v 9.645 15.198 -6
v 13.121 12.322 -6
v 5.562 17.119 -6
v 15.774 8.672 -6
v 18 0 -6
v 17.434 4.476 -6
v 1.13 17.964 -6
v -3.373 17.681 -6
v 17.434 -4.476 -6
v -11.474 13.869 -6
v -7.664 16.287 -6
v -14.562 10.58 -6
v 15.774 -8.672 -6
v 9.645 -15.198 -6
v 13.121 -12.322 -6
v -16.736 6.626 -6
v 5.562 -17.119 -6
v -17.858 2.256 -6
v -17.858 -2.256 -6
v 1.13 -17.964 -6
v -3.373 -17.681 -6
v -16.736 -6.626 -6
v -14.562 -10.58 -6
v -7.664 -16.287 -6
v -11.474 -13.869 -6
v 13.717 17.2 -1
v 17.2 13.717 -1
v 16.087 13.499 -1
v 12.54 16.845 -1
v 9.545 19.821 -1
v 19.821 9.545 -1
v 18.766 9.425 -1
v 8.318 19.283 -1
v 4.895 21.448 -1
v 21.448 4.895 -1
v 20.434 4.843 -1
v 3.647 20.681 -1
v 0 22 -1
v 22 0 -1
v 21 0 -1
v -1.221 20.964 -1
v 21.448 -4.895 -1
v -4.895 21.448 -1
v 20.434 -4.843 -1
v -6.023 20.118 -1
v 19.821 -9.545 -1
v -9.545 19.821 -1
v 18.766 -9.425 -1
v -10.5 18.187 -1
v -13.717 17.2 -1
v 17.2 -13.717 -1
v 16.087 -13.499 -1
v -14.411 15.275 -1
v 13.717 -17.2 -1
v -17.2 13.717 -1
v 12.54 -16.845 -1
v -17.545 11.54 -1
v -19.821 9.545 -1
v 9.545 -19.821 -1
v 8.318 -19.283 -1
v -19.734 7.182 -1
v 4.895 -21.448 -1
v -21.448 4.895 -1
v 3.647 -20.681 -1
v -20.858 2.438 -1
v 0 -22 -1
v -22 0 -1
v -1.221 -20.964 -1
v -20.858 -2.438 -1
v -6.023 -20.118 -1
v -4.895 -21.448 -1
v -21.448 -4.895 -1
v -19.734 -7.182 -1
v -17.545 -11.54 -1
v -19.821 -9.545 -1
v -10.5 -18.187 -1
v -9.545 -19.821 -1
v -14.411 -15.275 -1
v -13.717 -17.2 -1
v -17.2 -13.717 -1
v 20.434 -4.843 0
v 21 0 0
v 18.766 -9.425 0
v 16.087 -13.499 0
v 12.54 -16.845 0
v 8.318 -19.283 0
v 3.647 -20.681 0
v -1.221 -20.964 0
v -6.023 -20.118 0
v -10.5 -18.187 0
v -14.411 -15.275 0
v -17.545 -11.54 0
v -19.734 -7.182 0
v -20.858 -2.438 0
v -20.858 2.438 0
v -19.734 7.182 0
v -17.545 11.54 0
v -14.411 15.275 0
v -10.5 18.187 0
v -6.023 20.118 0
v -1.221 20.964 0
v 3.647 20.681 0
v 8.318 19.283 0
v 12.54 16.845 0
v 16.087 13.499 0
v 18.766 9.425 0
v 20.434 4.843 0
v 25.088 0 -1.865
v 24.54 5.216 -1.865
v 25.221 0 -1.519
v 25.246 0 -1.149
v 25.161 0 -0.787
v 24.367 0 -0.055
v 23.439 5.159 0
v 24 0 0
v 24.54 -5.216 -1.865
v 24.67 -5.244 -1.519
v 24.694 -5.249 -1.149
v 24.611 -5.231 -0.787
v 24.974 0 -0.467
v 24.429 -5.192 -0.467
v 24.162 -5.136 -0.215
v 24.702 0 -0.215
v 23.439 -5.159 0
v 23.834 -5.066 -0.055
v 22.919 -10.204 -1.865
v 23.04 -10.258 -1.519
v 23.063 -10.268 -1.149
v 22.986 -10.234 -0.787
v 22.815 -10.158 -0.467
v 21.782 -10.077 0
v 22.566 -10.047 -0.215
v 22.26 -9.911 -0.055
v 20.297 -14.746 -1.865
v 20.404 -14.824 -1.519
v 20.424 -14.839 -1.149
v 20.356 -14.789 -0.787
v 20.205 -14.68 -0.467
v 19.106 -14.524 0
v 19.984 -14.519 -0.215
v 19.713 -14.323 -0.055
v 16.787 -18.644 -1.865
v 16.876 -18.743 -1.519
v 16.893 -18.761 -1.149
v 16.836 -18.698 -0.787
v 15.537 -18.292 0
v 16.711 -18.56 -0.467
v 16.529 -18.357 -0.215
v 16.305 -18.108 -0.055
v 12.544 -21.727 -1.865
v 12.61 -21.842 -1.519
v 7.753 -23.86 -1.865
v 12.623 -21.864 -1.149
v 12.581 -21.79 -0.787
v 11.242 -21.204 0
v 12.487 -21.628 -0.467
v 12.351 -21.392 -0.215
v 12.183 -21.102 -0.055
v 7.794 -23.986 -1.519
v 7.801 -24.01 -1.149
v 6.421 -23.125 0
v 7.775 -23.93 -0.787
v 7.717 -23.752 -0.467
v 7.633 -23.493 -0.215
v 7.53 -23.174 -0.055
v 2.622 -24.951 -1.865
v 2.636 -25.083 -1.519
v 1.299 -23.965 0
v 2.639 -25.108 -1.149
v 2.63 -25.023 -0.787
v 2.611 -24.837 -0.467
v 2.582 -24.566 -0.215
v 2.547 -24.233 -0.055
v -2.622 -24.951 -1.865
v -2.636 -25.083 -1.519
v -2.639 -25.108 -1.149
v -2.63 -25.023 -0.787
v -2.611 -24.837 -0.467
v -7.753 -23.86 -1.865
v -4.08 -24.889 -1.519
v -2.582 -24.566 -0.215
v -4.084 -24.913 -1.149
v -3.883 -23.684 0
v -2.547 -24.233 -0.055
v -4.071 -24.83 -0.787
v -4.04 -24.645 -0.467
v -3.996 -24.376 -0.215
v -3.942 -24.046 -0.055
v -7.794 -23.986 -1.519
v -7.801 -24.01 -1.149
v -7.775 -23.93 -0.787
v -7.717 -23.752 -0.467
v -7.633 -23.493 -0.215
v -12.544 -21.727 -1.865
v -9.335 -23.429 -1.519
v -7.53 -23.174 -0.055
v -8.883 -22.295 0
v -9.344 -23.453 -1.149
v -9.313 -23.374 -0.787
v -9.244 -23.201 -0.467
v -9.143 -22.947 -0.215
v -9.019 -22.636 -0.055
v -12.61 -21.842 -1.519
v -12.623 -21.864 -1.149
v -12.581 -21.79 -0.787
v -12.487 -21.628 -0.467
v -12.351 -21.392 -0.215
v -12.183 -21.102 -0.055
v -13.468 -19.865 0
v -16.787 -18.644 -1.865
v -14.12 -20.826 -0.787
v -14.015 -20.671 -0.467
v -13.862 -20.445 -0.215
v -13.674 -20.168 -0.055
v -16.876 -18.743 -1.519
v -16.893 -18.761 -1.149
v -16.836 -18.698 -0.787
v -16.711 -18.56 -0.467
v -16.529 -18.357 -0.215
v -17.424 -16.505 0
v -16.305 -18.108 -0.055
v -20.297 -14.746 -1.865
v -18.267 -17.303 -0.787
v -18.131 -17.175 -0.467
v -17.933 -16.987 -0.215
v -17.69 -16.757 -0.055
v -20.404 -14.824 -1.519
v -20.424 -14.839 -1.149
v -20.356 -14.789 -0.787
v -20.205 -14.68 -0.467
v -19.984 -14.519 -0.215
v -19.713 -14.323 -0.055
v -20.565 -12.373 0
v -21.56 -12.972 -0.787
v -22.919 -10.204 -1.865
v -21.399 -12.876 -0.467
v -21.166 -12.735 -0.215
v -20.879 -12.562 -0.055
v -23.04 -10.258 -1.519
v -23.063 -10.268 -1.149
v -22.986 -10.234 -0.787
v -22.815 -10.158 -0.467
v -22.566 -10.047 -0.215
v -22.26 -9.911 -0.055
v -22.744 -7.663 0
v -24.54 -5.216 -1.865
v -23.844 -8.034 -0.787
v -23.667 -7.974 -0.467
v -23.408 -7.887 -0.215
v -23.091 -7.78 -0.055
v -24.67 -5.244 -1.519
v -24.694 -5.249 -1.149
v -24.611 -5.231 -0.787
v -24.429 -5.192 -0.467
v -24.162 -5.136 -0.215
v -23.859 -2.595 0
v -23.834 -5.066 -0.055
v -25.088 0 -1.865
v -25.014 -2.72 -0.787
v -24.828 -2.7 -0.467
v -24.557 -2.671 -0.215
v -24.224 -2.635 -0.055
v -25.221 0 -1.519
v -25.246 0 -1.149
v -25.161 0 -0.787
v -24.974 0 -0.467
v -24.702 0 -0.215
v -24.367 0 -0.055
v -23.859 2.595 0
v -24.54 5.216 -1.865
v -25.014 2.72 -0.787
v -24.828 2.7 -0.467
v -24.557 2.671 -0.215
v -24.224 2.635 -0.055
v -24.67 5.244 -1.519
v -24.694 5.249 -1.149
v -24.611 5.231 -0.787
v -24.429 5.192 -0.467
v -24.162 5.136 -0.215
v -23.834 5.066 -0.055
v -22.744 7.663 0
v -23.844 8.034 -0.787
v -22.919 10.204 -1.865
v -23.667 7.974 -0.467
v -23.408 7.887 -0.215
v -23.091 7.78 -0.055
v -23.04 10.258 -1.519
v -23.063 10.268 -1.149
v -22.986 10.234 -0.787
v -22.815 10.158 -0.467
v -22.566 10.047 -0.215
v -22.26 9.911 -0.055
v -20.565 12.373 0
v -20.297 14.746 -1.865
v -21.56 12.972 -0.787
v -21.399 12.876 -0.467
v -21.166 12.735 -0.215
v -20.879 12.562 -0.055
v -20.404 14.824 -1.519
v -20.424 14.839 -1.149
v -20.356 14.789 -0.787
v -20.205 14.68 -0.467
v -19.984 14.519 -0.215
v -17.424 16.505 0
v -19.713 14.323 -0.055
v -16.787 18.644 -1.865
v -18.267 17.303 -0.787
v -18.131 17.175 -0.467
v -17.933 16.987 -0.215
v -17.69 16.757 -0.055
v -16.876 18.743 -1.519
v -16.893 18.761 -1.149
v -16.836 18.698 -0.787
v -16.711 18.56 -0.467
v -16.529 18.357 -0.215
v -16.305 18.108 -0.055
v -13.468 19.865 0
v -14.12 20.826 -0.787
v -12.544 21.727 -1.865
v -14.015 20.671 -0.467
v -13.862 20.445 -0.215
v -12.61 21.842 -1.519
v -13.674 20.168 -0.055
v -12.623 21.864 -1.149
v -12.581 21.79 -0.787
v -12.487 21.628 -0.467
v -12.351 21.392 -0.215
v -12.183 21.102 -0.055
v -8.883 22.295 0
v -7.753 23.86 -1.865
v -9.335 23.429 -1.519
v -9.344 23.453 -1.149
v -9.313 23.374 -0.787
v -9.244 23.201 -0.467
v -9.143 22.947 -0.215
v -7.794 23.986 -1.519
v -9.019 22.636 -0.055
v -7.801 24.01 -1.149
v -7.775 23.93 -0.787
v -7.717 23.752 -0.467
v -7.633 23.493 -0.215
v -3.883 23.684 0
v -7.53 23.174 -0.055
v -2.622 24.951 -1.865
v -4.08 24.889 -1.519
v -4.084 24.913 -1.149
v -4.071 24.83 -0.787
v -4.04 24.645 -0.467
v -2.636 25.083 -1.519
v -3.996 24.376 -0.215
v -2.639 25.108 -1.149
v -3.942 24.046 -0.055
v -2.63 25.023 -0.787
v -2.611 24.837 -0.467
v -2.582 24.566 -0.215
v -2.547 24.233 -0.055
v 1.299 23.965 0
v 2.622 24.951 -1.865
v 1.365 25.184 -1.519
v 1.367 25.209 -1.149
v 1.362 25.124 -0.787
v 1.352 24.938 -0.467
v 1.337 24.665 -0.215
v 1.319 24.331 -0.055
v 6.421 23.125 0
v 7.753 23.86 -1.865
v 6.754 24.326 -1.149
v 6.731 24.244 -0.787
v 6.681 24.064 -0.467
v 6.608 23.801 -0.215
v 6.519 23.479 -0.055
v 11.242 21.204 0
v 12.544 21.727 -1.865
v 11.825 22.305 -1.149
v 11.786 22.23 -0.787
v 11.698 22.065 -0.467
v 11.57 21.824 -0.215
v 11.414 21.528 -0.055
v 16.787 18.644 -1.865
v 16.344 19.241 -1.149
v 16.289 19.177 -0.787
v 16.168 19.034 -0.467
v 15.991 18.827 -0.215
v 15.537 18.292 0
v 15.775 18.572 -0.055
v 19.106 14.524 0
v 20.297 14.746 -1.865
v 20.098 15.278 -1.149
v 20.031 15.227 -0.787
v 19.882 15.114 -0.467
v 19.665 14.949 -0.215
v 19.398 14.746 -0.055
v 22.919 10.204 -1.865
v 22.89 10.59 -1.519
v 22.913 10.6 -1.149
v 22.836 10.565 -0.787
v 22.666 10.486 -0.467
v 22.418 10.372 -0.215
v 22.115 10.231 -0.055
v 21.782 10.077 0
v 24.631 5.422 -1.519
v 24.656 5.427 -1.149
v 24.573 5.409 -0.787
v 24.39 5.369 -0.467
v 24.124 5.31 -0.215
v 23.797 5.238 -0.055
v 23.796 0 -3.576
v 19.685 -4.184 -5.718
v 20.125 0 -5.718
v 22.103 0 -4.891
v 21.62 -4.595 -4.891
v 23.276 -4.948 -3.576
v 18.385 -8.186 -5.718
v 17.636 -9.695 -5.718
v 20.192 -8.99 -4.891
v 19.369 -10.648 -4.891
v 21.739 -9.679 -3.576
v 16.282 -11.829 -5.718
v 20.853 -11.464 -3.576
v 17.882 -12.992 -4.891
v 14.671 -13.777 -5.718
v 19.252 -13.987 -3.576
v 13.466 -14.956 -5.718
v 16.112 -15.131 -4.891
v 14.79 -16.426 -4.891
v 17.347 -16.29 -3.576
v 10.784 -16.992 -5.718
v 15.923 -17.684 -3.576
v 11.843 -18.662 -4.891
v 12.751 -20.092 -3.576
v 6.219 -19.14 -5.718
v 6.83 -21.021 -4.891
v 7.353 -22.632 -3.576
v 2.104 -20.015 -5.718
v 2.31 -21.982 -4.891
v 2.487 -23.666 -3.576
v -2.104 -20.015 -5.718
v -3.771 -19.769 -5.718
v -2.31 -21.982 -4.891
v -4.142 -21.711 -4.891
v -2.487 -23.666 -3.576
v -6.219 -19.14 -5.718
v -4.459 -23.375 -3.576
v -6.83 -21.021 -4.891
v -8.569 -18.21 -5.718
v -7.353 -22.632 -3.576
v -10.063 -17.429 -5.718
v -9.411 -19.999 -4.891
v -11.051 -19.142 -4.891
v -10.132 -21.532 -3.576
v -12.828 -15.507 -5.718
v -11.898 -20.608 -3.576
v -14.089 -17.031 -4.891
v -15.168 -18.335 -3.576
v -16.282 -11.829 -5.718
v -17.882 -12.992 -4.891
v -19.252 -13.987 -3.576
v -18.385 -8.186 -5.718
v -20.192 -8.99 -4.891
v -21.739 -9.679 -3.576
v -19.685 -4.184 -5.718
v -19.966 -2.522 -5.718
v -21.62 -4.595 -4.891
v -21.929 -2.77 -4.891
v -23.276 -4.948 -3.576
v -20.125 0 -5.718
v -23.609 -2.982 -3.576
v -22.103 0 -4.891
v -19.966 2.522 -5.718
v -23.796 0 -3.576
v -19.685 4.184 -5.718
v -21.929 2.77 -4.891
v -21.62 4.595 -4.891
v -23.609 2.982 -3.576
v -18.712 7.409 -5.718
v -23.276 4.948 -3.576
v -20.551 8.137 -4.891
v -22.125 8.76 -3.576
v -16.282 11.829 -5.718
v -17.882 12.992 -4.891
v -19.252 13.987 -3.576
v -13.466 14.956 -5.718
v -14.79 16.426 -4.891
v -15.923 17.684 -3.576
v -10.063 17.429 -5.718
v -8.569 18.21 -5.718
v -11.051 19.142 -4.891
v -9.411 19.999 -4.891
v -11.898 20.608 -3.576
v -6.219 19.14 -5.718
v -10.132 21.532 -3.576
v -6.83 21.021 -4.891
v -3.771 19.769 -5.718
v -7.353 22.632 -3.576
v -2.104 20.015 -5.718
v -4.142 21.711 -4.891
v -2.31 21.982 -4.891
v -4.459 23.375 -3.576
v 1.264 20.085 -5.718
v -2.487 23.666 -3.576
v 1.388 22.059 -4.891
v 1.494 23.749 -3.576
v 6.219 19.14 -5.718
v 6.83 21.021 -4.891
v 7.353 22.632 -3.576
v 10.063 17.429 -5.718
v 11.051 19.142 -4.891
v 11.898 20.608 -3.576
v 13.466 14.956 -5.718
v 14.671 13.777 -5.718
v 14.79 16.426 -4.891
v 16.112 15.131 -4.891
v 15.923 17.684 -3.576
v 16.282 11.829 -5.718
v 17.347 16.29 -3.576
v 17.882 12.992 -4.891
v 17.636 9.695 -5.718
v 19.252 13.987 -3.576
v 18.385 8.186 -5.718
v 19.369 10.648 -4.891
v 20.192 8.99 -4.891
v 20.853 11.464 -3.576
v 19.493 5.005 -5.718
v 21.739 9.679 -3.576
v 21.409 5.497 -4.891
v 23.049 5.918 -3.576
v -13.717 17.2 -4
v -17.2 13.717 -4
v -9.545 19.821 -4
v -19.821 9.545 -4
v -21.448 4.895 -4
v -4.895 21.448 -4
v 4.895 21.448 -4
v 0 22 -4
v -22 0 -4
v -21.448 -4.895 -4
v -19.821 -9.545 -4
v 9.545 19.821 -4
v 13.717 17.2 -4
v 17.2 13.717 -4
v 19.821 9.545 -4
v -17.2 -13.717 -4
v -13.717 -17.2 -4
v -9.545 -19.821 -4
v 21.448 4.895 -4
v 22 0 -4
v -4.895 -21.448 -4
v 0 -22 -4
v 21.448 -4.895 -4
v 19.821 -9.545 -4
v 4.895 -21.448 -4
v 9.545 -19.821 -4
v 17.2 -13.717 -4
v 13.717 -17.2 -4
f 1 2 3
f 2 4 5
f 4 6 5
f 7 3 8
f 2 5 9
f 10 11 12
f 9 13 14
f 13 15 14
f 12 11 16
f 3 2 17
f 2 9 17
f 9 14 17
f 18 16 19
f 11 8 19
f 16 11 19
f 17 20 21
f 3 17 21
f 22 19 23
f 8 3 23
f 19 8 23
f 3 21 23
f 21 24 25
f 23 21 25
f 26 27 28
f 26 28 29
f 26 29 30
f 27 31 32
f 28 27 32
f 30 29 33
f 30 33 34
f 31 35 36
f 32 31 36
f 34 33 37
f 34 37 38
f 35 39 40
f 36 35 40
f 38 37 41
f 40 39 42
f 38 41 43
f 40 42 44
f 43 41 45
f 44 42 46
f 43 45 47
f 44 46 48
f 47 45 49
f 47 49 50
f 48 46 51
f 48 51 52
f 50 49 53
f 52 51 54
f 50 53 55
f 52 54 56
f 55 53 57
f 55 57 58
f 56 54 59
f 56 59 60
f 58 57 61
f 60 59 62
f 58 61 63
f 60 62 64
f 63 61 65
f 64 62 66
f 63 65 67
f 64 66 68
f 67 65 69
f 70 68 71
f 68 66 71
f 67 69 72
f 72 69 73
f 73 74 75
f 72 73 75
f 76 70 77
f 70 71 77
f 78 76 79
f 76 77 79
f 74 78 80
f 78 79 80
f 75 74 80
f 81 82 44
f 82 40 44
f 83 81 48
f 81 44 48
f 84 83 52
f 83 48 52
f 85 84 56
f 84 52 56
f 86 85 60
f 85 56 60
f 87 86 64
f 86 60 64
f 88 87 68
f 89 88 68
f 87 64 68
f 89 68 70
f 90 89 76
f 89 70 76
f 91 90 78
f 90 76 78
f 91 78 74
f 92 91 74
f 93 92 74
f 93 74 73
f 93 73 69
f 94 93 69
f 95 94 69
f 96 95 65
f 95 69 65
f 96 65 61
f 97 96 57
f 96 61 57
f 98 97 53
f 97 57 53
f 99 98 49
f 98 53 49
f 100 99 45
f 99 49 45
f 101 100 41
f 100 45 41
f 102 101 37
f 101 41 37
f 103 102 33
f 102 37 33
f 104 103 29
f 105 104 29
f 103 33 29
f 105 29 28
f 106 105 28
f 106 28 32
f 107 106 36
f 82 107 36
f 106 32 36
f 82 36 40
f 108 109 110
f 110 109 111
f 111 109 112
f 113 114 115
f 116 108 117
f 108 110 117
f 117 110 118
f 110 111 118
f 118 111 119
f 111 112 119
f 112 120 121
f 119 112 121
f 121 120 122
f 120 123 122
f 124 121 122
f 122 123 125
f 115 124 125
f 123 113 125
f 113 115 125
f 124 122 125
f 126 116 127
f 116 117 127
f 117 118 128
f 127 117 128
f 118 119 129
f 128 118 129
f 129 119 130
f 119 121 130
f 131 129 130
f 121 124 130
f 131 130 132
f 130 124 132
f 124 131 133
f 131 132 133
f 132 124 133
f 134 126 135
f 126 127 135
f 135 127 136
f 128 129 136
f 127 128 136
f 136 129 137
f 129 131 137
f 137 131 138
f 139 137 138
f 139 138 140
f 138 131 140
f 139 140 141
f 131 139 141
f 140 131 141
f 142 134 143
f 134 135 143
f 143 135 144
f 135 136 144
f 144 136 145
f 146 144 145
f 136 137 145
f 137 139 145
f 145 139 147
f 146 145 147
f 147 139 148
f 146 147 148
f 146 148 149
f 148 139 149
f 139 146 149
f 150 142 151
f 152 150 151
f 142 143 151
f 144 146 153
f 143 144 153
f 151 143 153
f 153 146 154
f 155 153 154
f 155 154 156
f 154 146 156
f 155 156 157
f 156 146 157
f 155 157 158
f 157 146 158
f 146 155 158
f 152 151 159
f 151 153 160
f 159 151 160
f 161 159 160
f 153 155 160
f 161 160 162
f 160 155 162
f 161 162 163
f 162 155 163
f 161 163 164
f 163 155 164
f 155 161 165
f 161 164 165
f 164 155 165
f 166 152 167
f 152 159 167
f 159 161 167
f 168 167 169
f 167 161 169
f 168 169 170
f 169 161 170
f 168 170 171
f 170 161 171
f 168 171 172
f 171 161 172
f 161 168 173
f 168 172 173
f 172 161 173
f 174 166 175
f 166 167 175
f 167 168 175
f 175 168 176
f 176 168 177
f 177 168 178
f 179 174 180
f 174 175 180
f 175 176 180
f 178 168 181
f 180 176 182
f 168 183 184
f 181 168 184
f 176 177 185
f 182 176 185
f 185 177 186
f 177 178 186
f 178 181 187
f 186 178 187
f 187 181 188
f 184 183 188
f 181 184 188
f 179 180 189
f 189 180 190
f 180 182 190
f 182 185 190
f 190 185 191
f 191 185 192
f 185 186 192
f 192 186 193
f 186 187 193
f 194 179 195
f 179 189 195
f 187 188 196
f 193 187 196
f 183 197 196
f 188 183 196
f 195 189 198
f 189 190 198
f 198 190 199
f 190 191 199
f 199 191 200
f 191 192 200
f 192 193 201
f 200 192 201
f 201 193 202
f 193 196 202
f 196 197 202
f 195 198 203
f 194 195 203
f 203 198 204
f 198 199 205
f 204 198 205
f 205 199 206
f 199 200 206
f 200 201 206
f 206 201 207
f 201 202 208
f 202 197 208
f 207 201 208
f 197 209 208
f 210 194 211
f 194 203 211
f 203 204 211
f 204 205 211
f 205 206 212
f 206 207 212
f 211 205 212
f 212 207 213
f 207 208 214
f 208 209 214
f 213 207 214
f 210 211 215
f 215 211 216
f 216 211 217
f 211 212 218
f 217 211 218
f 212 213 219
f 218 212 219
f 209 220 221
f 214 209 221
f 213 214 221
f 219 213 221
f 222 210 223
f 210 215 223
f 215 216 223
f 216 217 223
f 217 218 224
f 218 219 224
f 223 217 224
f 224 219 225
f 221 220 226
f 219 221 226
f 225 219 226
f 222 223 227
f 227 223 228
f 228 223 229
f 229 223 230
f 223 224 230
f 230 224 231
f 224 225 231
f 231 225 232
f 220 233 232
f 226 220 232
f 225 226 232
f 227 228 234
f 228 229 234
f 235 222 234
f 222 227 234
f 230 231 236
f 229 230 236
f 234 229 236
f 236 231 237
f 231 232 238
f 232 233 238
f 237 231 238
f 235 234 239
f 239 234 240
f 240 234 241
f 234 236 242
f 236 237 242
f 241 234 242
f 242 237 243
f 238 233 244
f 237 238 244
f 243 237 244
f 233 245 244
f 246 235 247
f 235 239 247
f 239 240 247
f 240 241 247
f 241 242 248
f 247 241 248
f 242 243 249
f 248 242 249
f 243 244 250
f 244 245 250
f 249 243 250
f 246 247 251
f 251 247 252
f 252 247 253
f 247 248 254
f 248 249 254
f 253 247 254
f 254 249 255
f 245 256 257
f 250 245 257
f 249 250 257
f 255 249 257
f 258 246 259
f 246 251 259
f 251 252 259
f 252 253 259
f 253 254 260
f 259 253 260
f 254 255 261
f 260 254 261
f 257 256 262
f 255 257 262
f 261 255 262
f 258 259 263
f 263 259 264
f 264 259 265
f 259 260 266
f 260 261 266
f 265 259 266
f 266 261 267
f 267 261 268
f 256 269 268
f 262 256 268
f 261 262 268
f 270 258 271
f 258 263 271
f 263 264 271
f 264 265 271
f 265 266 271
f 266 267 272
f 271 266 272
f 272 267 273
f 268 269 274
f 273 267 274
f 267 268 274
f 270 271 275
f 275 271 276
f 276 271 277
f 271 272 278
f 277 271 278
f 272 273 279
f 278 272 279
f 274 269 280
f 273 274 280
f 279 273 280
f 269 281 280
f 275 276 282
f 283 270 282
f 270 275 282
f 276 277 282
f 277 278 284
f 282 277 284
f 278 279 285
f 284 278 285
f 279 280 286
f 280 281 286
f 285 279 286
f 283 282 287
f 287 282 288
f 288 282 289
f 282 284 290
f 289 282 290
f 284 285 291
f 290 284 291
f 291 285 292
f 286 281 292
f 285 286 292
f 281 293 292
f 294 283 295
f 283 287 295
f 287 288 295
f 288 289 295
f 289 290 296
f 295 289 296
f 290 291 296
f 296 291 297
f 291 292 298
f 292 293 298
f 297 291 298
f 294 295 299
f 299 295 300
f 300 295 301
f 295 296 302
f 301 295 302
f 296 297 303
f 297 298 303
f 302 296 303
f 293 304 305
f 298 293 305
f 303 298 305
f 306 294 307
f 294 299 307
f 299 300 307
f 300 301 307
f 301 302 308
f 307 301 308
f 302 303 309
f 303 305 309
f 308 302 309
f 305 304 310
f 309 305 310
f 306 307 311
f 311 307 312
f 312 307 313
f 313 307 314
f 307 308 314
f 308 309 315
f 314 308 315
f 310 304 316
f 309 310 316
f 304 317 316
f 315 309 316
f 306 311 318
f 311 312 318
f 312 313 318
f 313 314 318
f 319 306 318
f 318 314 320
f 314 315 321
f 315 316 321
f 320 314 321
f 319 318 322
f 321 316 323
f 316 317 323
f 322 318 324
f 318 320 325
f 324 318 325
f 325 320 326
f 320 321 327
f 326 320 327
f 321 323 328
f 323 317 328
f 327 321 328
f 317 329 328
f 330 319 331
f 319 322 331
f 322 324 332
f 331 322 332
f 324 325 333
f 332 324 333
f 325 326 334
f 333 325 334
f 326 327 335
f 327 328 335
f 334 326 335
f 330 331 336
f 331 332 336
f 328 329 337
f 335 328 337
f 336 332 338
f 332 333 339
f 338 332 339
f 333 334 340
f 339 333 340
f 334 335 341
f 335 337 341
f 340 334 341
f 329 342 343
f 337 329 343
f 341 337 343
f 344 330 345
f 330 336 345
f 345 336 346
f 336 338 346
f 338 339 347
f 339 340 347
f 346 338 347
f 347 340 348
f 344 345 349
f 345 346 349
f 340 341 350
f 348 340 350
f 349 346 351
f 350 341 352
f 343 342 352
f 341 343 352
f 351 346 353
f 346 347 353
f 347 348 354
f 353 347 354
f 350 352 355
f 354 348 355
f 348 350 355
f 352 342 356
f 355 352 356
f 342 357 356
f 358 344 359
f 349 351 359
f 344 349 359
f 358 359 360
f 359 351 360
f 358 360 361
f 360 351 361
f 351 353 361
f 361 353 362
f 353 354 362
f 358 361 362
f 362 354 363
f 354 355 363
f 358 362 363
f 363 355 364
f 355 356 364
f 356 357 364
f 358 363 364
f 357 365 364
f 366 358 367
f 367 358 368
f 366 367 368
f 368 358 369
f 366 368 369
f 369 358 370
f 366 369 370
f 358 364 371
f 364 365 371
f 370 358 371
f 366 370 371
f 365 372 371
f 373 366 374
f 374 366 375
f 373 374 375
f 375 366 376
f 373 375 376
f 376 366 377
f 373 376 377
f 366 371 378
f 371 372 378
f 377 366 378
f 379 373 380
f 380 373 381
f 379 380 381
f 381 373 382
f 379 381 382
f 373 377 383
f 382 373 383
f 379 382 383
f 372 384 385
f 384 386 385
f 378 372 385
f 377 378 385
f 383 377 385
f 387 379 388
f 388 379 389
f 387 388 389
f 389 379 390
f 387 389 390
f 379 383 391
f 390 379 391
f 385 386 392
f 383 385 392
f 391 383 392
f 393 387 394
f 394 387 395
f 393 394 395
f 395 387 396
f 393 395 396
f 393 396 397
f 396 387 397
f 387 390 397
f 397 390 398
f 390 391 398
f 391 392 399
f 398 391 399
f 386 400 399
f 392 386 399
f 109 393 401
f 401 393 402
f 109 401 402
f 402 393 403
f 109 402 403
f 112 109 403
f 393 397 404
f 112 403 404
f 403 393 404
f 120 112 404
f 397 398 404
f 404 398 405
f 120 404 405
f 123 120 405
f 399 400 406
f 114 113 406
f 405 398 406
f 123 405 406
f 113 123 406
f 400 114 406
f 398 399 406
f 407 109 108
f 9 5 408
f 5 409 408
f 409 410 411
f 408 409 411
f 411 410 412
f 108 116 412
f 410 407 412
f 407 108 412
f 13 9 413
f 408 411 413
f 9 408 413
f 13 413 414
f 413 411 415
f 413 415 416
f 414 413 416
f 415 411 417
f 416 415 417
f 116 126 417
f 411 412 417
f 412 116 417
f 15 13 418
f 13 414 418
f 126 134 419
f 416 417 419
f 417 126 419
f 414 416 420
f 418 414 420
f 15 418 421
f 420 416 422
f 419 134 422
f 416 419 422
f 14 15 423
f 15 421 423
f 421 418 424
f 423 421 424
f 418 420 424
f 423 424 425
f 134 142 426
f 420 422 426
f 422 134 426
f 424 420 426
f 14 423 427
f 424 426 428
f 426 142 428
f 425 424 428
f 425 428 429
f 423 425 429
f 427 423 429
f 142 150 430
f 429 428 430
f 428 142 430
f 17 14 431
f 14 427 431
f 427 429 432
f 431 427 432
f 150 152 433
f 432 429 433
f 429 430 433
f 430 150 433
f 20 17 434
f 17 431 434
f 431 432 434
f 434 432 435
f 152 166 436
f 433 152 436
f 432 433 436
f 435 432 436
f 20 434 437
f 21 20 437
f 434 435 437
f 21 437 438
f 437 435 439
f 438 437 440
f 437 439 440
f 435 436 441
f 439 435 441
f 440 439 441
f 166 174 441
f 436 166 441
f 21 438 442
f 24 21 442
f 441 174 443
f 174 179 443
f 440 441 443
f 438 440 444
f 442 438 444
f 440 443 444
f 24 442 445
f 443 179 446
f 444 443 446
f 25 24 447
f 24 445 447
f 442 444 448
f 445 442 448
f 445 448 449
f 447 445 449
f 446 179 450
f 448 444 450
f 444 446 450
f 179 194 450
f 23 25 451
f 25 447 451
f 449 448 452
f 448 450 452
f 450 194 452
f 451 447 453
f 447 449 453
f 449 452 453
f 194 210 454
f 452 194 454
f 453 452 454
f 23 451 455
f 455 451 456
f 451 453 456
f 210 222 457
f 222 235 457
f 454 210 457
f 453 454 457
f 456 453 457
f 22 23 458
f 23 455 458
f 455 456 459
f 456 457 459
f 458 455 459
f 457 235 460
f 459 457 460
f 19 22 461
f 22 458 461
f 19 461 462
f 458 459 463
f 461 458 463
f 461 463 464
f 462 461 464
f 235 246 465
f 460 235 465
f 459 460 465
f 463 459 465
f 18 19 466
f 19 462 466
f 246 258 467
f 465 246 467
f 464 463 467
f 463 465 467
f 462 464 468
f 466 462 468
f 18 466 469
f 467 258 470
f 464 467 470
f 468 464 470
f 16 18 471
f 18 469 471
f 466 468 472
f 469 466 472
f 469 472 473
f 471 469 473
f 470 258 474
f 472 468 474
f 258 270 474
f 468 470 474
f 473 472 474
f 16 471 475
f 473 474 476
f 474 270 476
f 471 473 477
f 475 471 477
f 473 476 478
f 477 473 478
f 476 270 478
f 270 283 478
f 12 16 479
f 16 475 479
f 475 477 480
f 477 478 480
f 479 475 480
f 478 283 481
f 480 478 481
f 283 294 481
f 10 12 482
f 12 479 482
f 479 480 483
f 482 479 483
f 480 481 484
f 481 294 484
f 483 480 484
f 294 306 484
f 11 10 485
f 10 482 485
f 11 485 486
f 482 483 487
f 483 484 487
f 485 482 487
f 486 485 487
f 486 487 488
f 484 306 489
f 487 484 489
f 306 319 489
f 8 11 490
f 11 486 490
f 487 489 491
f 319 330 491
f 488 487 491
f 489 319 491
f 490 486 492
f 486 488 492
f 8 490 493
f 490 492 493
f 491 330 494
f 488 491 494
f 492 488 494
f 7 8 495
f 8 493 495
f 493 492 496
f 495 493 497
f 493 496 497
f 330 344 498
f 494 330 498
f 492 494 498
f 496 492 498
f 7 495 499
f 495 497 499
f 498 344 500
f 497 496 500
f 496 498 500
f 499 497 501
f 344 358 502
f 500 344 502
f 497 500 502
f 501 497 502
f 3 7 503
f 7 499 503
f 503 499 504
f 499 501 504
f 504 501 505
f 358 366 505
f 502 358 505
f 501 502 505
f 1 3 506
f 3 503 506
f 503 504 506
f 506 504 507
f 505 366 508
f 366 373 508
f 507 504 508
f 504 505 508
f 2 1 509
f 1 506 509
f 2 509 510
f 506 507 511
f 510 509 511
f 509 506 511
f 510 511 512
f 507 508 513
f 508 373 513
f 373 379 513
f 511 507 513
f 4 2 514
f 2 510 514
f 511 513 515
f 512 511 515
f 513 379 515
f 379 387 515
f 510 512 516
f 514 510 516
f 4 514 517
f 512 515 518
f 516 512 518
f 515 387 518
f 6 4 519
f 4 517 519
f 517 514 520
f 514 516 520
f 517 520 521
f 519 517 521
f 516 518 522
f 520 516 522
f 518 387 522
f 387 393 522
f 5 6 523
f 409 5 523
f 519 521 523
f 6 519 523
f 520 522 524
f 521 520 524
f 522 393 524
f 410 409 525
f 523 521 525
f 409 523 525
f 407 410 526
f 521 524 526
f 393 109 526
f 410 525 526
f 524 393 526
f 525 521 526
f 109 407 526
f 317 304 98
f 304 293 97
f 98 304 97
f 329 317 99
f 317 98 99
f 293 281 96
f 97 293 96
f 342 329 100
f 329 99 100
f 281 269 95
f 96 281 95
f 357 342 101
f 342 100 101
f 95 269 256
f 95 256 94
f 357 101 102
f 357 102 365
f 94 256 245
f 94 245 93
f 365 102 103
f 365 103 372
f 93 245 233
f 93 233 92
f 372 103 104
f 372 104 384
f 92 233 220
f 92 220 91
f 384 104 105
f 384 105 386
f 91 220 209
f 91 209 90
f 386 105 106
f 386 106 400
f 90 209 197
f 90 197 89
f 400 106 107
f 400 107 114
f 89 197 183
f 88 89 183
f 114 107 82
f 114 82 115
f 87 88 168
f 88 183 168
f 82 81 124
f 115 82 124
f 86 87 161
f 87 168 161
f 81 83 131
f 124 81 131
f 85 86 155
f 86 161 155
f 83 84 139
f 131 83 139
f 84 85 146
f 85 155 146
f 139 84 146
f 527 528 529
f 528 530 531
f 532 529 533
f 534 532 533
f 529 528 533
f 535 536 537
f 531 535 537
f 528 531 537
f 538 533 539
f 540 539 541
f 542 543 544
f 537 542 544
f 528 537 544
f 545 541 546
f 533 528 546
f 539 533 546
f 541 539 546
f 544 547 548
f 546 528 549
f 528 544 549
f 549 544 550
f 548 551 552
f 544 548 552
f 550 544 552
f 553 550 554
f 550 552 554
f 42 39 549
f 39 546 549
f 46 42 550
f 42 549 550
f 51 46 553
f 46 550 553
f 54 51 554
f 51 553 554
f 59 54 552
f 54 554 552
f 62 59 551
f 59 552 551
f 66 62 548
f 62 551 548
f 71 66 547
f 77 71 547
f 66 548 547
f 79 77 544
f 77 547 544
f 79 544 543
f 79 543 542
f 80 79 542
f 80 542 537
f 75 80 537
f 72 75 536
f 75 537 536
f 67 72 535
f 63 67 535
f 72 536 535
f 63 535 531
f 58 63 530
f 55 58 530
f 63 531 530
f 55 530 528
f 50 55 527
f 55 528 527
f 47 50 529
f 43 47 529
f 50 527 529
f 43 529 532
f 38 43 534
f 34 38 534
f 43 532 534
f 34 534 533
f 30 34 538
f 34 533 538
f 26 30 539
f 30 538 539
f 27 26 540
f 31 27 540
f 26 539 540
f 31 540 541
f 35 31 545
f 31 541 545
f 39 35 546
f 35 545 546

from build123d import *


with BuildPart() as part:
    # Croquis1 → Revolución1 (revolve)
    with BuildSketch(Plane(origin=(0, 0, 0), x_dir=(1, 0, 0), z_dir=(0, 1, 0))):
        with BuildLine():
            Line((0, 6), (18, 6))
            ThreePointArc((18, 6), (22.102949779, 4.89077105), (25.088082902, 1.865284974))
            ThreePointArc((25.088082902, 1.865284974), (25.079723626, 0.620161218), (24, 0))
            Line((24, 0), (21, 0))
            Line((21, 0), (21, 1))
            Line((21, 1), (22, 1))
            Line((22, 1), (22, 4))
            Line((22, 4), (0, 4))
            Line((0, 4), (0, 6))
        make_face()
    revolve(axis=Axis((0, 0, 0), (0, 0, -1)))


solid = part.part
